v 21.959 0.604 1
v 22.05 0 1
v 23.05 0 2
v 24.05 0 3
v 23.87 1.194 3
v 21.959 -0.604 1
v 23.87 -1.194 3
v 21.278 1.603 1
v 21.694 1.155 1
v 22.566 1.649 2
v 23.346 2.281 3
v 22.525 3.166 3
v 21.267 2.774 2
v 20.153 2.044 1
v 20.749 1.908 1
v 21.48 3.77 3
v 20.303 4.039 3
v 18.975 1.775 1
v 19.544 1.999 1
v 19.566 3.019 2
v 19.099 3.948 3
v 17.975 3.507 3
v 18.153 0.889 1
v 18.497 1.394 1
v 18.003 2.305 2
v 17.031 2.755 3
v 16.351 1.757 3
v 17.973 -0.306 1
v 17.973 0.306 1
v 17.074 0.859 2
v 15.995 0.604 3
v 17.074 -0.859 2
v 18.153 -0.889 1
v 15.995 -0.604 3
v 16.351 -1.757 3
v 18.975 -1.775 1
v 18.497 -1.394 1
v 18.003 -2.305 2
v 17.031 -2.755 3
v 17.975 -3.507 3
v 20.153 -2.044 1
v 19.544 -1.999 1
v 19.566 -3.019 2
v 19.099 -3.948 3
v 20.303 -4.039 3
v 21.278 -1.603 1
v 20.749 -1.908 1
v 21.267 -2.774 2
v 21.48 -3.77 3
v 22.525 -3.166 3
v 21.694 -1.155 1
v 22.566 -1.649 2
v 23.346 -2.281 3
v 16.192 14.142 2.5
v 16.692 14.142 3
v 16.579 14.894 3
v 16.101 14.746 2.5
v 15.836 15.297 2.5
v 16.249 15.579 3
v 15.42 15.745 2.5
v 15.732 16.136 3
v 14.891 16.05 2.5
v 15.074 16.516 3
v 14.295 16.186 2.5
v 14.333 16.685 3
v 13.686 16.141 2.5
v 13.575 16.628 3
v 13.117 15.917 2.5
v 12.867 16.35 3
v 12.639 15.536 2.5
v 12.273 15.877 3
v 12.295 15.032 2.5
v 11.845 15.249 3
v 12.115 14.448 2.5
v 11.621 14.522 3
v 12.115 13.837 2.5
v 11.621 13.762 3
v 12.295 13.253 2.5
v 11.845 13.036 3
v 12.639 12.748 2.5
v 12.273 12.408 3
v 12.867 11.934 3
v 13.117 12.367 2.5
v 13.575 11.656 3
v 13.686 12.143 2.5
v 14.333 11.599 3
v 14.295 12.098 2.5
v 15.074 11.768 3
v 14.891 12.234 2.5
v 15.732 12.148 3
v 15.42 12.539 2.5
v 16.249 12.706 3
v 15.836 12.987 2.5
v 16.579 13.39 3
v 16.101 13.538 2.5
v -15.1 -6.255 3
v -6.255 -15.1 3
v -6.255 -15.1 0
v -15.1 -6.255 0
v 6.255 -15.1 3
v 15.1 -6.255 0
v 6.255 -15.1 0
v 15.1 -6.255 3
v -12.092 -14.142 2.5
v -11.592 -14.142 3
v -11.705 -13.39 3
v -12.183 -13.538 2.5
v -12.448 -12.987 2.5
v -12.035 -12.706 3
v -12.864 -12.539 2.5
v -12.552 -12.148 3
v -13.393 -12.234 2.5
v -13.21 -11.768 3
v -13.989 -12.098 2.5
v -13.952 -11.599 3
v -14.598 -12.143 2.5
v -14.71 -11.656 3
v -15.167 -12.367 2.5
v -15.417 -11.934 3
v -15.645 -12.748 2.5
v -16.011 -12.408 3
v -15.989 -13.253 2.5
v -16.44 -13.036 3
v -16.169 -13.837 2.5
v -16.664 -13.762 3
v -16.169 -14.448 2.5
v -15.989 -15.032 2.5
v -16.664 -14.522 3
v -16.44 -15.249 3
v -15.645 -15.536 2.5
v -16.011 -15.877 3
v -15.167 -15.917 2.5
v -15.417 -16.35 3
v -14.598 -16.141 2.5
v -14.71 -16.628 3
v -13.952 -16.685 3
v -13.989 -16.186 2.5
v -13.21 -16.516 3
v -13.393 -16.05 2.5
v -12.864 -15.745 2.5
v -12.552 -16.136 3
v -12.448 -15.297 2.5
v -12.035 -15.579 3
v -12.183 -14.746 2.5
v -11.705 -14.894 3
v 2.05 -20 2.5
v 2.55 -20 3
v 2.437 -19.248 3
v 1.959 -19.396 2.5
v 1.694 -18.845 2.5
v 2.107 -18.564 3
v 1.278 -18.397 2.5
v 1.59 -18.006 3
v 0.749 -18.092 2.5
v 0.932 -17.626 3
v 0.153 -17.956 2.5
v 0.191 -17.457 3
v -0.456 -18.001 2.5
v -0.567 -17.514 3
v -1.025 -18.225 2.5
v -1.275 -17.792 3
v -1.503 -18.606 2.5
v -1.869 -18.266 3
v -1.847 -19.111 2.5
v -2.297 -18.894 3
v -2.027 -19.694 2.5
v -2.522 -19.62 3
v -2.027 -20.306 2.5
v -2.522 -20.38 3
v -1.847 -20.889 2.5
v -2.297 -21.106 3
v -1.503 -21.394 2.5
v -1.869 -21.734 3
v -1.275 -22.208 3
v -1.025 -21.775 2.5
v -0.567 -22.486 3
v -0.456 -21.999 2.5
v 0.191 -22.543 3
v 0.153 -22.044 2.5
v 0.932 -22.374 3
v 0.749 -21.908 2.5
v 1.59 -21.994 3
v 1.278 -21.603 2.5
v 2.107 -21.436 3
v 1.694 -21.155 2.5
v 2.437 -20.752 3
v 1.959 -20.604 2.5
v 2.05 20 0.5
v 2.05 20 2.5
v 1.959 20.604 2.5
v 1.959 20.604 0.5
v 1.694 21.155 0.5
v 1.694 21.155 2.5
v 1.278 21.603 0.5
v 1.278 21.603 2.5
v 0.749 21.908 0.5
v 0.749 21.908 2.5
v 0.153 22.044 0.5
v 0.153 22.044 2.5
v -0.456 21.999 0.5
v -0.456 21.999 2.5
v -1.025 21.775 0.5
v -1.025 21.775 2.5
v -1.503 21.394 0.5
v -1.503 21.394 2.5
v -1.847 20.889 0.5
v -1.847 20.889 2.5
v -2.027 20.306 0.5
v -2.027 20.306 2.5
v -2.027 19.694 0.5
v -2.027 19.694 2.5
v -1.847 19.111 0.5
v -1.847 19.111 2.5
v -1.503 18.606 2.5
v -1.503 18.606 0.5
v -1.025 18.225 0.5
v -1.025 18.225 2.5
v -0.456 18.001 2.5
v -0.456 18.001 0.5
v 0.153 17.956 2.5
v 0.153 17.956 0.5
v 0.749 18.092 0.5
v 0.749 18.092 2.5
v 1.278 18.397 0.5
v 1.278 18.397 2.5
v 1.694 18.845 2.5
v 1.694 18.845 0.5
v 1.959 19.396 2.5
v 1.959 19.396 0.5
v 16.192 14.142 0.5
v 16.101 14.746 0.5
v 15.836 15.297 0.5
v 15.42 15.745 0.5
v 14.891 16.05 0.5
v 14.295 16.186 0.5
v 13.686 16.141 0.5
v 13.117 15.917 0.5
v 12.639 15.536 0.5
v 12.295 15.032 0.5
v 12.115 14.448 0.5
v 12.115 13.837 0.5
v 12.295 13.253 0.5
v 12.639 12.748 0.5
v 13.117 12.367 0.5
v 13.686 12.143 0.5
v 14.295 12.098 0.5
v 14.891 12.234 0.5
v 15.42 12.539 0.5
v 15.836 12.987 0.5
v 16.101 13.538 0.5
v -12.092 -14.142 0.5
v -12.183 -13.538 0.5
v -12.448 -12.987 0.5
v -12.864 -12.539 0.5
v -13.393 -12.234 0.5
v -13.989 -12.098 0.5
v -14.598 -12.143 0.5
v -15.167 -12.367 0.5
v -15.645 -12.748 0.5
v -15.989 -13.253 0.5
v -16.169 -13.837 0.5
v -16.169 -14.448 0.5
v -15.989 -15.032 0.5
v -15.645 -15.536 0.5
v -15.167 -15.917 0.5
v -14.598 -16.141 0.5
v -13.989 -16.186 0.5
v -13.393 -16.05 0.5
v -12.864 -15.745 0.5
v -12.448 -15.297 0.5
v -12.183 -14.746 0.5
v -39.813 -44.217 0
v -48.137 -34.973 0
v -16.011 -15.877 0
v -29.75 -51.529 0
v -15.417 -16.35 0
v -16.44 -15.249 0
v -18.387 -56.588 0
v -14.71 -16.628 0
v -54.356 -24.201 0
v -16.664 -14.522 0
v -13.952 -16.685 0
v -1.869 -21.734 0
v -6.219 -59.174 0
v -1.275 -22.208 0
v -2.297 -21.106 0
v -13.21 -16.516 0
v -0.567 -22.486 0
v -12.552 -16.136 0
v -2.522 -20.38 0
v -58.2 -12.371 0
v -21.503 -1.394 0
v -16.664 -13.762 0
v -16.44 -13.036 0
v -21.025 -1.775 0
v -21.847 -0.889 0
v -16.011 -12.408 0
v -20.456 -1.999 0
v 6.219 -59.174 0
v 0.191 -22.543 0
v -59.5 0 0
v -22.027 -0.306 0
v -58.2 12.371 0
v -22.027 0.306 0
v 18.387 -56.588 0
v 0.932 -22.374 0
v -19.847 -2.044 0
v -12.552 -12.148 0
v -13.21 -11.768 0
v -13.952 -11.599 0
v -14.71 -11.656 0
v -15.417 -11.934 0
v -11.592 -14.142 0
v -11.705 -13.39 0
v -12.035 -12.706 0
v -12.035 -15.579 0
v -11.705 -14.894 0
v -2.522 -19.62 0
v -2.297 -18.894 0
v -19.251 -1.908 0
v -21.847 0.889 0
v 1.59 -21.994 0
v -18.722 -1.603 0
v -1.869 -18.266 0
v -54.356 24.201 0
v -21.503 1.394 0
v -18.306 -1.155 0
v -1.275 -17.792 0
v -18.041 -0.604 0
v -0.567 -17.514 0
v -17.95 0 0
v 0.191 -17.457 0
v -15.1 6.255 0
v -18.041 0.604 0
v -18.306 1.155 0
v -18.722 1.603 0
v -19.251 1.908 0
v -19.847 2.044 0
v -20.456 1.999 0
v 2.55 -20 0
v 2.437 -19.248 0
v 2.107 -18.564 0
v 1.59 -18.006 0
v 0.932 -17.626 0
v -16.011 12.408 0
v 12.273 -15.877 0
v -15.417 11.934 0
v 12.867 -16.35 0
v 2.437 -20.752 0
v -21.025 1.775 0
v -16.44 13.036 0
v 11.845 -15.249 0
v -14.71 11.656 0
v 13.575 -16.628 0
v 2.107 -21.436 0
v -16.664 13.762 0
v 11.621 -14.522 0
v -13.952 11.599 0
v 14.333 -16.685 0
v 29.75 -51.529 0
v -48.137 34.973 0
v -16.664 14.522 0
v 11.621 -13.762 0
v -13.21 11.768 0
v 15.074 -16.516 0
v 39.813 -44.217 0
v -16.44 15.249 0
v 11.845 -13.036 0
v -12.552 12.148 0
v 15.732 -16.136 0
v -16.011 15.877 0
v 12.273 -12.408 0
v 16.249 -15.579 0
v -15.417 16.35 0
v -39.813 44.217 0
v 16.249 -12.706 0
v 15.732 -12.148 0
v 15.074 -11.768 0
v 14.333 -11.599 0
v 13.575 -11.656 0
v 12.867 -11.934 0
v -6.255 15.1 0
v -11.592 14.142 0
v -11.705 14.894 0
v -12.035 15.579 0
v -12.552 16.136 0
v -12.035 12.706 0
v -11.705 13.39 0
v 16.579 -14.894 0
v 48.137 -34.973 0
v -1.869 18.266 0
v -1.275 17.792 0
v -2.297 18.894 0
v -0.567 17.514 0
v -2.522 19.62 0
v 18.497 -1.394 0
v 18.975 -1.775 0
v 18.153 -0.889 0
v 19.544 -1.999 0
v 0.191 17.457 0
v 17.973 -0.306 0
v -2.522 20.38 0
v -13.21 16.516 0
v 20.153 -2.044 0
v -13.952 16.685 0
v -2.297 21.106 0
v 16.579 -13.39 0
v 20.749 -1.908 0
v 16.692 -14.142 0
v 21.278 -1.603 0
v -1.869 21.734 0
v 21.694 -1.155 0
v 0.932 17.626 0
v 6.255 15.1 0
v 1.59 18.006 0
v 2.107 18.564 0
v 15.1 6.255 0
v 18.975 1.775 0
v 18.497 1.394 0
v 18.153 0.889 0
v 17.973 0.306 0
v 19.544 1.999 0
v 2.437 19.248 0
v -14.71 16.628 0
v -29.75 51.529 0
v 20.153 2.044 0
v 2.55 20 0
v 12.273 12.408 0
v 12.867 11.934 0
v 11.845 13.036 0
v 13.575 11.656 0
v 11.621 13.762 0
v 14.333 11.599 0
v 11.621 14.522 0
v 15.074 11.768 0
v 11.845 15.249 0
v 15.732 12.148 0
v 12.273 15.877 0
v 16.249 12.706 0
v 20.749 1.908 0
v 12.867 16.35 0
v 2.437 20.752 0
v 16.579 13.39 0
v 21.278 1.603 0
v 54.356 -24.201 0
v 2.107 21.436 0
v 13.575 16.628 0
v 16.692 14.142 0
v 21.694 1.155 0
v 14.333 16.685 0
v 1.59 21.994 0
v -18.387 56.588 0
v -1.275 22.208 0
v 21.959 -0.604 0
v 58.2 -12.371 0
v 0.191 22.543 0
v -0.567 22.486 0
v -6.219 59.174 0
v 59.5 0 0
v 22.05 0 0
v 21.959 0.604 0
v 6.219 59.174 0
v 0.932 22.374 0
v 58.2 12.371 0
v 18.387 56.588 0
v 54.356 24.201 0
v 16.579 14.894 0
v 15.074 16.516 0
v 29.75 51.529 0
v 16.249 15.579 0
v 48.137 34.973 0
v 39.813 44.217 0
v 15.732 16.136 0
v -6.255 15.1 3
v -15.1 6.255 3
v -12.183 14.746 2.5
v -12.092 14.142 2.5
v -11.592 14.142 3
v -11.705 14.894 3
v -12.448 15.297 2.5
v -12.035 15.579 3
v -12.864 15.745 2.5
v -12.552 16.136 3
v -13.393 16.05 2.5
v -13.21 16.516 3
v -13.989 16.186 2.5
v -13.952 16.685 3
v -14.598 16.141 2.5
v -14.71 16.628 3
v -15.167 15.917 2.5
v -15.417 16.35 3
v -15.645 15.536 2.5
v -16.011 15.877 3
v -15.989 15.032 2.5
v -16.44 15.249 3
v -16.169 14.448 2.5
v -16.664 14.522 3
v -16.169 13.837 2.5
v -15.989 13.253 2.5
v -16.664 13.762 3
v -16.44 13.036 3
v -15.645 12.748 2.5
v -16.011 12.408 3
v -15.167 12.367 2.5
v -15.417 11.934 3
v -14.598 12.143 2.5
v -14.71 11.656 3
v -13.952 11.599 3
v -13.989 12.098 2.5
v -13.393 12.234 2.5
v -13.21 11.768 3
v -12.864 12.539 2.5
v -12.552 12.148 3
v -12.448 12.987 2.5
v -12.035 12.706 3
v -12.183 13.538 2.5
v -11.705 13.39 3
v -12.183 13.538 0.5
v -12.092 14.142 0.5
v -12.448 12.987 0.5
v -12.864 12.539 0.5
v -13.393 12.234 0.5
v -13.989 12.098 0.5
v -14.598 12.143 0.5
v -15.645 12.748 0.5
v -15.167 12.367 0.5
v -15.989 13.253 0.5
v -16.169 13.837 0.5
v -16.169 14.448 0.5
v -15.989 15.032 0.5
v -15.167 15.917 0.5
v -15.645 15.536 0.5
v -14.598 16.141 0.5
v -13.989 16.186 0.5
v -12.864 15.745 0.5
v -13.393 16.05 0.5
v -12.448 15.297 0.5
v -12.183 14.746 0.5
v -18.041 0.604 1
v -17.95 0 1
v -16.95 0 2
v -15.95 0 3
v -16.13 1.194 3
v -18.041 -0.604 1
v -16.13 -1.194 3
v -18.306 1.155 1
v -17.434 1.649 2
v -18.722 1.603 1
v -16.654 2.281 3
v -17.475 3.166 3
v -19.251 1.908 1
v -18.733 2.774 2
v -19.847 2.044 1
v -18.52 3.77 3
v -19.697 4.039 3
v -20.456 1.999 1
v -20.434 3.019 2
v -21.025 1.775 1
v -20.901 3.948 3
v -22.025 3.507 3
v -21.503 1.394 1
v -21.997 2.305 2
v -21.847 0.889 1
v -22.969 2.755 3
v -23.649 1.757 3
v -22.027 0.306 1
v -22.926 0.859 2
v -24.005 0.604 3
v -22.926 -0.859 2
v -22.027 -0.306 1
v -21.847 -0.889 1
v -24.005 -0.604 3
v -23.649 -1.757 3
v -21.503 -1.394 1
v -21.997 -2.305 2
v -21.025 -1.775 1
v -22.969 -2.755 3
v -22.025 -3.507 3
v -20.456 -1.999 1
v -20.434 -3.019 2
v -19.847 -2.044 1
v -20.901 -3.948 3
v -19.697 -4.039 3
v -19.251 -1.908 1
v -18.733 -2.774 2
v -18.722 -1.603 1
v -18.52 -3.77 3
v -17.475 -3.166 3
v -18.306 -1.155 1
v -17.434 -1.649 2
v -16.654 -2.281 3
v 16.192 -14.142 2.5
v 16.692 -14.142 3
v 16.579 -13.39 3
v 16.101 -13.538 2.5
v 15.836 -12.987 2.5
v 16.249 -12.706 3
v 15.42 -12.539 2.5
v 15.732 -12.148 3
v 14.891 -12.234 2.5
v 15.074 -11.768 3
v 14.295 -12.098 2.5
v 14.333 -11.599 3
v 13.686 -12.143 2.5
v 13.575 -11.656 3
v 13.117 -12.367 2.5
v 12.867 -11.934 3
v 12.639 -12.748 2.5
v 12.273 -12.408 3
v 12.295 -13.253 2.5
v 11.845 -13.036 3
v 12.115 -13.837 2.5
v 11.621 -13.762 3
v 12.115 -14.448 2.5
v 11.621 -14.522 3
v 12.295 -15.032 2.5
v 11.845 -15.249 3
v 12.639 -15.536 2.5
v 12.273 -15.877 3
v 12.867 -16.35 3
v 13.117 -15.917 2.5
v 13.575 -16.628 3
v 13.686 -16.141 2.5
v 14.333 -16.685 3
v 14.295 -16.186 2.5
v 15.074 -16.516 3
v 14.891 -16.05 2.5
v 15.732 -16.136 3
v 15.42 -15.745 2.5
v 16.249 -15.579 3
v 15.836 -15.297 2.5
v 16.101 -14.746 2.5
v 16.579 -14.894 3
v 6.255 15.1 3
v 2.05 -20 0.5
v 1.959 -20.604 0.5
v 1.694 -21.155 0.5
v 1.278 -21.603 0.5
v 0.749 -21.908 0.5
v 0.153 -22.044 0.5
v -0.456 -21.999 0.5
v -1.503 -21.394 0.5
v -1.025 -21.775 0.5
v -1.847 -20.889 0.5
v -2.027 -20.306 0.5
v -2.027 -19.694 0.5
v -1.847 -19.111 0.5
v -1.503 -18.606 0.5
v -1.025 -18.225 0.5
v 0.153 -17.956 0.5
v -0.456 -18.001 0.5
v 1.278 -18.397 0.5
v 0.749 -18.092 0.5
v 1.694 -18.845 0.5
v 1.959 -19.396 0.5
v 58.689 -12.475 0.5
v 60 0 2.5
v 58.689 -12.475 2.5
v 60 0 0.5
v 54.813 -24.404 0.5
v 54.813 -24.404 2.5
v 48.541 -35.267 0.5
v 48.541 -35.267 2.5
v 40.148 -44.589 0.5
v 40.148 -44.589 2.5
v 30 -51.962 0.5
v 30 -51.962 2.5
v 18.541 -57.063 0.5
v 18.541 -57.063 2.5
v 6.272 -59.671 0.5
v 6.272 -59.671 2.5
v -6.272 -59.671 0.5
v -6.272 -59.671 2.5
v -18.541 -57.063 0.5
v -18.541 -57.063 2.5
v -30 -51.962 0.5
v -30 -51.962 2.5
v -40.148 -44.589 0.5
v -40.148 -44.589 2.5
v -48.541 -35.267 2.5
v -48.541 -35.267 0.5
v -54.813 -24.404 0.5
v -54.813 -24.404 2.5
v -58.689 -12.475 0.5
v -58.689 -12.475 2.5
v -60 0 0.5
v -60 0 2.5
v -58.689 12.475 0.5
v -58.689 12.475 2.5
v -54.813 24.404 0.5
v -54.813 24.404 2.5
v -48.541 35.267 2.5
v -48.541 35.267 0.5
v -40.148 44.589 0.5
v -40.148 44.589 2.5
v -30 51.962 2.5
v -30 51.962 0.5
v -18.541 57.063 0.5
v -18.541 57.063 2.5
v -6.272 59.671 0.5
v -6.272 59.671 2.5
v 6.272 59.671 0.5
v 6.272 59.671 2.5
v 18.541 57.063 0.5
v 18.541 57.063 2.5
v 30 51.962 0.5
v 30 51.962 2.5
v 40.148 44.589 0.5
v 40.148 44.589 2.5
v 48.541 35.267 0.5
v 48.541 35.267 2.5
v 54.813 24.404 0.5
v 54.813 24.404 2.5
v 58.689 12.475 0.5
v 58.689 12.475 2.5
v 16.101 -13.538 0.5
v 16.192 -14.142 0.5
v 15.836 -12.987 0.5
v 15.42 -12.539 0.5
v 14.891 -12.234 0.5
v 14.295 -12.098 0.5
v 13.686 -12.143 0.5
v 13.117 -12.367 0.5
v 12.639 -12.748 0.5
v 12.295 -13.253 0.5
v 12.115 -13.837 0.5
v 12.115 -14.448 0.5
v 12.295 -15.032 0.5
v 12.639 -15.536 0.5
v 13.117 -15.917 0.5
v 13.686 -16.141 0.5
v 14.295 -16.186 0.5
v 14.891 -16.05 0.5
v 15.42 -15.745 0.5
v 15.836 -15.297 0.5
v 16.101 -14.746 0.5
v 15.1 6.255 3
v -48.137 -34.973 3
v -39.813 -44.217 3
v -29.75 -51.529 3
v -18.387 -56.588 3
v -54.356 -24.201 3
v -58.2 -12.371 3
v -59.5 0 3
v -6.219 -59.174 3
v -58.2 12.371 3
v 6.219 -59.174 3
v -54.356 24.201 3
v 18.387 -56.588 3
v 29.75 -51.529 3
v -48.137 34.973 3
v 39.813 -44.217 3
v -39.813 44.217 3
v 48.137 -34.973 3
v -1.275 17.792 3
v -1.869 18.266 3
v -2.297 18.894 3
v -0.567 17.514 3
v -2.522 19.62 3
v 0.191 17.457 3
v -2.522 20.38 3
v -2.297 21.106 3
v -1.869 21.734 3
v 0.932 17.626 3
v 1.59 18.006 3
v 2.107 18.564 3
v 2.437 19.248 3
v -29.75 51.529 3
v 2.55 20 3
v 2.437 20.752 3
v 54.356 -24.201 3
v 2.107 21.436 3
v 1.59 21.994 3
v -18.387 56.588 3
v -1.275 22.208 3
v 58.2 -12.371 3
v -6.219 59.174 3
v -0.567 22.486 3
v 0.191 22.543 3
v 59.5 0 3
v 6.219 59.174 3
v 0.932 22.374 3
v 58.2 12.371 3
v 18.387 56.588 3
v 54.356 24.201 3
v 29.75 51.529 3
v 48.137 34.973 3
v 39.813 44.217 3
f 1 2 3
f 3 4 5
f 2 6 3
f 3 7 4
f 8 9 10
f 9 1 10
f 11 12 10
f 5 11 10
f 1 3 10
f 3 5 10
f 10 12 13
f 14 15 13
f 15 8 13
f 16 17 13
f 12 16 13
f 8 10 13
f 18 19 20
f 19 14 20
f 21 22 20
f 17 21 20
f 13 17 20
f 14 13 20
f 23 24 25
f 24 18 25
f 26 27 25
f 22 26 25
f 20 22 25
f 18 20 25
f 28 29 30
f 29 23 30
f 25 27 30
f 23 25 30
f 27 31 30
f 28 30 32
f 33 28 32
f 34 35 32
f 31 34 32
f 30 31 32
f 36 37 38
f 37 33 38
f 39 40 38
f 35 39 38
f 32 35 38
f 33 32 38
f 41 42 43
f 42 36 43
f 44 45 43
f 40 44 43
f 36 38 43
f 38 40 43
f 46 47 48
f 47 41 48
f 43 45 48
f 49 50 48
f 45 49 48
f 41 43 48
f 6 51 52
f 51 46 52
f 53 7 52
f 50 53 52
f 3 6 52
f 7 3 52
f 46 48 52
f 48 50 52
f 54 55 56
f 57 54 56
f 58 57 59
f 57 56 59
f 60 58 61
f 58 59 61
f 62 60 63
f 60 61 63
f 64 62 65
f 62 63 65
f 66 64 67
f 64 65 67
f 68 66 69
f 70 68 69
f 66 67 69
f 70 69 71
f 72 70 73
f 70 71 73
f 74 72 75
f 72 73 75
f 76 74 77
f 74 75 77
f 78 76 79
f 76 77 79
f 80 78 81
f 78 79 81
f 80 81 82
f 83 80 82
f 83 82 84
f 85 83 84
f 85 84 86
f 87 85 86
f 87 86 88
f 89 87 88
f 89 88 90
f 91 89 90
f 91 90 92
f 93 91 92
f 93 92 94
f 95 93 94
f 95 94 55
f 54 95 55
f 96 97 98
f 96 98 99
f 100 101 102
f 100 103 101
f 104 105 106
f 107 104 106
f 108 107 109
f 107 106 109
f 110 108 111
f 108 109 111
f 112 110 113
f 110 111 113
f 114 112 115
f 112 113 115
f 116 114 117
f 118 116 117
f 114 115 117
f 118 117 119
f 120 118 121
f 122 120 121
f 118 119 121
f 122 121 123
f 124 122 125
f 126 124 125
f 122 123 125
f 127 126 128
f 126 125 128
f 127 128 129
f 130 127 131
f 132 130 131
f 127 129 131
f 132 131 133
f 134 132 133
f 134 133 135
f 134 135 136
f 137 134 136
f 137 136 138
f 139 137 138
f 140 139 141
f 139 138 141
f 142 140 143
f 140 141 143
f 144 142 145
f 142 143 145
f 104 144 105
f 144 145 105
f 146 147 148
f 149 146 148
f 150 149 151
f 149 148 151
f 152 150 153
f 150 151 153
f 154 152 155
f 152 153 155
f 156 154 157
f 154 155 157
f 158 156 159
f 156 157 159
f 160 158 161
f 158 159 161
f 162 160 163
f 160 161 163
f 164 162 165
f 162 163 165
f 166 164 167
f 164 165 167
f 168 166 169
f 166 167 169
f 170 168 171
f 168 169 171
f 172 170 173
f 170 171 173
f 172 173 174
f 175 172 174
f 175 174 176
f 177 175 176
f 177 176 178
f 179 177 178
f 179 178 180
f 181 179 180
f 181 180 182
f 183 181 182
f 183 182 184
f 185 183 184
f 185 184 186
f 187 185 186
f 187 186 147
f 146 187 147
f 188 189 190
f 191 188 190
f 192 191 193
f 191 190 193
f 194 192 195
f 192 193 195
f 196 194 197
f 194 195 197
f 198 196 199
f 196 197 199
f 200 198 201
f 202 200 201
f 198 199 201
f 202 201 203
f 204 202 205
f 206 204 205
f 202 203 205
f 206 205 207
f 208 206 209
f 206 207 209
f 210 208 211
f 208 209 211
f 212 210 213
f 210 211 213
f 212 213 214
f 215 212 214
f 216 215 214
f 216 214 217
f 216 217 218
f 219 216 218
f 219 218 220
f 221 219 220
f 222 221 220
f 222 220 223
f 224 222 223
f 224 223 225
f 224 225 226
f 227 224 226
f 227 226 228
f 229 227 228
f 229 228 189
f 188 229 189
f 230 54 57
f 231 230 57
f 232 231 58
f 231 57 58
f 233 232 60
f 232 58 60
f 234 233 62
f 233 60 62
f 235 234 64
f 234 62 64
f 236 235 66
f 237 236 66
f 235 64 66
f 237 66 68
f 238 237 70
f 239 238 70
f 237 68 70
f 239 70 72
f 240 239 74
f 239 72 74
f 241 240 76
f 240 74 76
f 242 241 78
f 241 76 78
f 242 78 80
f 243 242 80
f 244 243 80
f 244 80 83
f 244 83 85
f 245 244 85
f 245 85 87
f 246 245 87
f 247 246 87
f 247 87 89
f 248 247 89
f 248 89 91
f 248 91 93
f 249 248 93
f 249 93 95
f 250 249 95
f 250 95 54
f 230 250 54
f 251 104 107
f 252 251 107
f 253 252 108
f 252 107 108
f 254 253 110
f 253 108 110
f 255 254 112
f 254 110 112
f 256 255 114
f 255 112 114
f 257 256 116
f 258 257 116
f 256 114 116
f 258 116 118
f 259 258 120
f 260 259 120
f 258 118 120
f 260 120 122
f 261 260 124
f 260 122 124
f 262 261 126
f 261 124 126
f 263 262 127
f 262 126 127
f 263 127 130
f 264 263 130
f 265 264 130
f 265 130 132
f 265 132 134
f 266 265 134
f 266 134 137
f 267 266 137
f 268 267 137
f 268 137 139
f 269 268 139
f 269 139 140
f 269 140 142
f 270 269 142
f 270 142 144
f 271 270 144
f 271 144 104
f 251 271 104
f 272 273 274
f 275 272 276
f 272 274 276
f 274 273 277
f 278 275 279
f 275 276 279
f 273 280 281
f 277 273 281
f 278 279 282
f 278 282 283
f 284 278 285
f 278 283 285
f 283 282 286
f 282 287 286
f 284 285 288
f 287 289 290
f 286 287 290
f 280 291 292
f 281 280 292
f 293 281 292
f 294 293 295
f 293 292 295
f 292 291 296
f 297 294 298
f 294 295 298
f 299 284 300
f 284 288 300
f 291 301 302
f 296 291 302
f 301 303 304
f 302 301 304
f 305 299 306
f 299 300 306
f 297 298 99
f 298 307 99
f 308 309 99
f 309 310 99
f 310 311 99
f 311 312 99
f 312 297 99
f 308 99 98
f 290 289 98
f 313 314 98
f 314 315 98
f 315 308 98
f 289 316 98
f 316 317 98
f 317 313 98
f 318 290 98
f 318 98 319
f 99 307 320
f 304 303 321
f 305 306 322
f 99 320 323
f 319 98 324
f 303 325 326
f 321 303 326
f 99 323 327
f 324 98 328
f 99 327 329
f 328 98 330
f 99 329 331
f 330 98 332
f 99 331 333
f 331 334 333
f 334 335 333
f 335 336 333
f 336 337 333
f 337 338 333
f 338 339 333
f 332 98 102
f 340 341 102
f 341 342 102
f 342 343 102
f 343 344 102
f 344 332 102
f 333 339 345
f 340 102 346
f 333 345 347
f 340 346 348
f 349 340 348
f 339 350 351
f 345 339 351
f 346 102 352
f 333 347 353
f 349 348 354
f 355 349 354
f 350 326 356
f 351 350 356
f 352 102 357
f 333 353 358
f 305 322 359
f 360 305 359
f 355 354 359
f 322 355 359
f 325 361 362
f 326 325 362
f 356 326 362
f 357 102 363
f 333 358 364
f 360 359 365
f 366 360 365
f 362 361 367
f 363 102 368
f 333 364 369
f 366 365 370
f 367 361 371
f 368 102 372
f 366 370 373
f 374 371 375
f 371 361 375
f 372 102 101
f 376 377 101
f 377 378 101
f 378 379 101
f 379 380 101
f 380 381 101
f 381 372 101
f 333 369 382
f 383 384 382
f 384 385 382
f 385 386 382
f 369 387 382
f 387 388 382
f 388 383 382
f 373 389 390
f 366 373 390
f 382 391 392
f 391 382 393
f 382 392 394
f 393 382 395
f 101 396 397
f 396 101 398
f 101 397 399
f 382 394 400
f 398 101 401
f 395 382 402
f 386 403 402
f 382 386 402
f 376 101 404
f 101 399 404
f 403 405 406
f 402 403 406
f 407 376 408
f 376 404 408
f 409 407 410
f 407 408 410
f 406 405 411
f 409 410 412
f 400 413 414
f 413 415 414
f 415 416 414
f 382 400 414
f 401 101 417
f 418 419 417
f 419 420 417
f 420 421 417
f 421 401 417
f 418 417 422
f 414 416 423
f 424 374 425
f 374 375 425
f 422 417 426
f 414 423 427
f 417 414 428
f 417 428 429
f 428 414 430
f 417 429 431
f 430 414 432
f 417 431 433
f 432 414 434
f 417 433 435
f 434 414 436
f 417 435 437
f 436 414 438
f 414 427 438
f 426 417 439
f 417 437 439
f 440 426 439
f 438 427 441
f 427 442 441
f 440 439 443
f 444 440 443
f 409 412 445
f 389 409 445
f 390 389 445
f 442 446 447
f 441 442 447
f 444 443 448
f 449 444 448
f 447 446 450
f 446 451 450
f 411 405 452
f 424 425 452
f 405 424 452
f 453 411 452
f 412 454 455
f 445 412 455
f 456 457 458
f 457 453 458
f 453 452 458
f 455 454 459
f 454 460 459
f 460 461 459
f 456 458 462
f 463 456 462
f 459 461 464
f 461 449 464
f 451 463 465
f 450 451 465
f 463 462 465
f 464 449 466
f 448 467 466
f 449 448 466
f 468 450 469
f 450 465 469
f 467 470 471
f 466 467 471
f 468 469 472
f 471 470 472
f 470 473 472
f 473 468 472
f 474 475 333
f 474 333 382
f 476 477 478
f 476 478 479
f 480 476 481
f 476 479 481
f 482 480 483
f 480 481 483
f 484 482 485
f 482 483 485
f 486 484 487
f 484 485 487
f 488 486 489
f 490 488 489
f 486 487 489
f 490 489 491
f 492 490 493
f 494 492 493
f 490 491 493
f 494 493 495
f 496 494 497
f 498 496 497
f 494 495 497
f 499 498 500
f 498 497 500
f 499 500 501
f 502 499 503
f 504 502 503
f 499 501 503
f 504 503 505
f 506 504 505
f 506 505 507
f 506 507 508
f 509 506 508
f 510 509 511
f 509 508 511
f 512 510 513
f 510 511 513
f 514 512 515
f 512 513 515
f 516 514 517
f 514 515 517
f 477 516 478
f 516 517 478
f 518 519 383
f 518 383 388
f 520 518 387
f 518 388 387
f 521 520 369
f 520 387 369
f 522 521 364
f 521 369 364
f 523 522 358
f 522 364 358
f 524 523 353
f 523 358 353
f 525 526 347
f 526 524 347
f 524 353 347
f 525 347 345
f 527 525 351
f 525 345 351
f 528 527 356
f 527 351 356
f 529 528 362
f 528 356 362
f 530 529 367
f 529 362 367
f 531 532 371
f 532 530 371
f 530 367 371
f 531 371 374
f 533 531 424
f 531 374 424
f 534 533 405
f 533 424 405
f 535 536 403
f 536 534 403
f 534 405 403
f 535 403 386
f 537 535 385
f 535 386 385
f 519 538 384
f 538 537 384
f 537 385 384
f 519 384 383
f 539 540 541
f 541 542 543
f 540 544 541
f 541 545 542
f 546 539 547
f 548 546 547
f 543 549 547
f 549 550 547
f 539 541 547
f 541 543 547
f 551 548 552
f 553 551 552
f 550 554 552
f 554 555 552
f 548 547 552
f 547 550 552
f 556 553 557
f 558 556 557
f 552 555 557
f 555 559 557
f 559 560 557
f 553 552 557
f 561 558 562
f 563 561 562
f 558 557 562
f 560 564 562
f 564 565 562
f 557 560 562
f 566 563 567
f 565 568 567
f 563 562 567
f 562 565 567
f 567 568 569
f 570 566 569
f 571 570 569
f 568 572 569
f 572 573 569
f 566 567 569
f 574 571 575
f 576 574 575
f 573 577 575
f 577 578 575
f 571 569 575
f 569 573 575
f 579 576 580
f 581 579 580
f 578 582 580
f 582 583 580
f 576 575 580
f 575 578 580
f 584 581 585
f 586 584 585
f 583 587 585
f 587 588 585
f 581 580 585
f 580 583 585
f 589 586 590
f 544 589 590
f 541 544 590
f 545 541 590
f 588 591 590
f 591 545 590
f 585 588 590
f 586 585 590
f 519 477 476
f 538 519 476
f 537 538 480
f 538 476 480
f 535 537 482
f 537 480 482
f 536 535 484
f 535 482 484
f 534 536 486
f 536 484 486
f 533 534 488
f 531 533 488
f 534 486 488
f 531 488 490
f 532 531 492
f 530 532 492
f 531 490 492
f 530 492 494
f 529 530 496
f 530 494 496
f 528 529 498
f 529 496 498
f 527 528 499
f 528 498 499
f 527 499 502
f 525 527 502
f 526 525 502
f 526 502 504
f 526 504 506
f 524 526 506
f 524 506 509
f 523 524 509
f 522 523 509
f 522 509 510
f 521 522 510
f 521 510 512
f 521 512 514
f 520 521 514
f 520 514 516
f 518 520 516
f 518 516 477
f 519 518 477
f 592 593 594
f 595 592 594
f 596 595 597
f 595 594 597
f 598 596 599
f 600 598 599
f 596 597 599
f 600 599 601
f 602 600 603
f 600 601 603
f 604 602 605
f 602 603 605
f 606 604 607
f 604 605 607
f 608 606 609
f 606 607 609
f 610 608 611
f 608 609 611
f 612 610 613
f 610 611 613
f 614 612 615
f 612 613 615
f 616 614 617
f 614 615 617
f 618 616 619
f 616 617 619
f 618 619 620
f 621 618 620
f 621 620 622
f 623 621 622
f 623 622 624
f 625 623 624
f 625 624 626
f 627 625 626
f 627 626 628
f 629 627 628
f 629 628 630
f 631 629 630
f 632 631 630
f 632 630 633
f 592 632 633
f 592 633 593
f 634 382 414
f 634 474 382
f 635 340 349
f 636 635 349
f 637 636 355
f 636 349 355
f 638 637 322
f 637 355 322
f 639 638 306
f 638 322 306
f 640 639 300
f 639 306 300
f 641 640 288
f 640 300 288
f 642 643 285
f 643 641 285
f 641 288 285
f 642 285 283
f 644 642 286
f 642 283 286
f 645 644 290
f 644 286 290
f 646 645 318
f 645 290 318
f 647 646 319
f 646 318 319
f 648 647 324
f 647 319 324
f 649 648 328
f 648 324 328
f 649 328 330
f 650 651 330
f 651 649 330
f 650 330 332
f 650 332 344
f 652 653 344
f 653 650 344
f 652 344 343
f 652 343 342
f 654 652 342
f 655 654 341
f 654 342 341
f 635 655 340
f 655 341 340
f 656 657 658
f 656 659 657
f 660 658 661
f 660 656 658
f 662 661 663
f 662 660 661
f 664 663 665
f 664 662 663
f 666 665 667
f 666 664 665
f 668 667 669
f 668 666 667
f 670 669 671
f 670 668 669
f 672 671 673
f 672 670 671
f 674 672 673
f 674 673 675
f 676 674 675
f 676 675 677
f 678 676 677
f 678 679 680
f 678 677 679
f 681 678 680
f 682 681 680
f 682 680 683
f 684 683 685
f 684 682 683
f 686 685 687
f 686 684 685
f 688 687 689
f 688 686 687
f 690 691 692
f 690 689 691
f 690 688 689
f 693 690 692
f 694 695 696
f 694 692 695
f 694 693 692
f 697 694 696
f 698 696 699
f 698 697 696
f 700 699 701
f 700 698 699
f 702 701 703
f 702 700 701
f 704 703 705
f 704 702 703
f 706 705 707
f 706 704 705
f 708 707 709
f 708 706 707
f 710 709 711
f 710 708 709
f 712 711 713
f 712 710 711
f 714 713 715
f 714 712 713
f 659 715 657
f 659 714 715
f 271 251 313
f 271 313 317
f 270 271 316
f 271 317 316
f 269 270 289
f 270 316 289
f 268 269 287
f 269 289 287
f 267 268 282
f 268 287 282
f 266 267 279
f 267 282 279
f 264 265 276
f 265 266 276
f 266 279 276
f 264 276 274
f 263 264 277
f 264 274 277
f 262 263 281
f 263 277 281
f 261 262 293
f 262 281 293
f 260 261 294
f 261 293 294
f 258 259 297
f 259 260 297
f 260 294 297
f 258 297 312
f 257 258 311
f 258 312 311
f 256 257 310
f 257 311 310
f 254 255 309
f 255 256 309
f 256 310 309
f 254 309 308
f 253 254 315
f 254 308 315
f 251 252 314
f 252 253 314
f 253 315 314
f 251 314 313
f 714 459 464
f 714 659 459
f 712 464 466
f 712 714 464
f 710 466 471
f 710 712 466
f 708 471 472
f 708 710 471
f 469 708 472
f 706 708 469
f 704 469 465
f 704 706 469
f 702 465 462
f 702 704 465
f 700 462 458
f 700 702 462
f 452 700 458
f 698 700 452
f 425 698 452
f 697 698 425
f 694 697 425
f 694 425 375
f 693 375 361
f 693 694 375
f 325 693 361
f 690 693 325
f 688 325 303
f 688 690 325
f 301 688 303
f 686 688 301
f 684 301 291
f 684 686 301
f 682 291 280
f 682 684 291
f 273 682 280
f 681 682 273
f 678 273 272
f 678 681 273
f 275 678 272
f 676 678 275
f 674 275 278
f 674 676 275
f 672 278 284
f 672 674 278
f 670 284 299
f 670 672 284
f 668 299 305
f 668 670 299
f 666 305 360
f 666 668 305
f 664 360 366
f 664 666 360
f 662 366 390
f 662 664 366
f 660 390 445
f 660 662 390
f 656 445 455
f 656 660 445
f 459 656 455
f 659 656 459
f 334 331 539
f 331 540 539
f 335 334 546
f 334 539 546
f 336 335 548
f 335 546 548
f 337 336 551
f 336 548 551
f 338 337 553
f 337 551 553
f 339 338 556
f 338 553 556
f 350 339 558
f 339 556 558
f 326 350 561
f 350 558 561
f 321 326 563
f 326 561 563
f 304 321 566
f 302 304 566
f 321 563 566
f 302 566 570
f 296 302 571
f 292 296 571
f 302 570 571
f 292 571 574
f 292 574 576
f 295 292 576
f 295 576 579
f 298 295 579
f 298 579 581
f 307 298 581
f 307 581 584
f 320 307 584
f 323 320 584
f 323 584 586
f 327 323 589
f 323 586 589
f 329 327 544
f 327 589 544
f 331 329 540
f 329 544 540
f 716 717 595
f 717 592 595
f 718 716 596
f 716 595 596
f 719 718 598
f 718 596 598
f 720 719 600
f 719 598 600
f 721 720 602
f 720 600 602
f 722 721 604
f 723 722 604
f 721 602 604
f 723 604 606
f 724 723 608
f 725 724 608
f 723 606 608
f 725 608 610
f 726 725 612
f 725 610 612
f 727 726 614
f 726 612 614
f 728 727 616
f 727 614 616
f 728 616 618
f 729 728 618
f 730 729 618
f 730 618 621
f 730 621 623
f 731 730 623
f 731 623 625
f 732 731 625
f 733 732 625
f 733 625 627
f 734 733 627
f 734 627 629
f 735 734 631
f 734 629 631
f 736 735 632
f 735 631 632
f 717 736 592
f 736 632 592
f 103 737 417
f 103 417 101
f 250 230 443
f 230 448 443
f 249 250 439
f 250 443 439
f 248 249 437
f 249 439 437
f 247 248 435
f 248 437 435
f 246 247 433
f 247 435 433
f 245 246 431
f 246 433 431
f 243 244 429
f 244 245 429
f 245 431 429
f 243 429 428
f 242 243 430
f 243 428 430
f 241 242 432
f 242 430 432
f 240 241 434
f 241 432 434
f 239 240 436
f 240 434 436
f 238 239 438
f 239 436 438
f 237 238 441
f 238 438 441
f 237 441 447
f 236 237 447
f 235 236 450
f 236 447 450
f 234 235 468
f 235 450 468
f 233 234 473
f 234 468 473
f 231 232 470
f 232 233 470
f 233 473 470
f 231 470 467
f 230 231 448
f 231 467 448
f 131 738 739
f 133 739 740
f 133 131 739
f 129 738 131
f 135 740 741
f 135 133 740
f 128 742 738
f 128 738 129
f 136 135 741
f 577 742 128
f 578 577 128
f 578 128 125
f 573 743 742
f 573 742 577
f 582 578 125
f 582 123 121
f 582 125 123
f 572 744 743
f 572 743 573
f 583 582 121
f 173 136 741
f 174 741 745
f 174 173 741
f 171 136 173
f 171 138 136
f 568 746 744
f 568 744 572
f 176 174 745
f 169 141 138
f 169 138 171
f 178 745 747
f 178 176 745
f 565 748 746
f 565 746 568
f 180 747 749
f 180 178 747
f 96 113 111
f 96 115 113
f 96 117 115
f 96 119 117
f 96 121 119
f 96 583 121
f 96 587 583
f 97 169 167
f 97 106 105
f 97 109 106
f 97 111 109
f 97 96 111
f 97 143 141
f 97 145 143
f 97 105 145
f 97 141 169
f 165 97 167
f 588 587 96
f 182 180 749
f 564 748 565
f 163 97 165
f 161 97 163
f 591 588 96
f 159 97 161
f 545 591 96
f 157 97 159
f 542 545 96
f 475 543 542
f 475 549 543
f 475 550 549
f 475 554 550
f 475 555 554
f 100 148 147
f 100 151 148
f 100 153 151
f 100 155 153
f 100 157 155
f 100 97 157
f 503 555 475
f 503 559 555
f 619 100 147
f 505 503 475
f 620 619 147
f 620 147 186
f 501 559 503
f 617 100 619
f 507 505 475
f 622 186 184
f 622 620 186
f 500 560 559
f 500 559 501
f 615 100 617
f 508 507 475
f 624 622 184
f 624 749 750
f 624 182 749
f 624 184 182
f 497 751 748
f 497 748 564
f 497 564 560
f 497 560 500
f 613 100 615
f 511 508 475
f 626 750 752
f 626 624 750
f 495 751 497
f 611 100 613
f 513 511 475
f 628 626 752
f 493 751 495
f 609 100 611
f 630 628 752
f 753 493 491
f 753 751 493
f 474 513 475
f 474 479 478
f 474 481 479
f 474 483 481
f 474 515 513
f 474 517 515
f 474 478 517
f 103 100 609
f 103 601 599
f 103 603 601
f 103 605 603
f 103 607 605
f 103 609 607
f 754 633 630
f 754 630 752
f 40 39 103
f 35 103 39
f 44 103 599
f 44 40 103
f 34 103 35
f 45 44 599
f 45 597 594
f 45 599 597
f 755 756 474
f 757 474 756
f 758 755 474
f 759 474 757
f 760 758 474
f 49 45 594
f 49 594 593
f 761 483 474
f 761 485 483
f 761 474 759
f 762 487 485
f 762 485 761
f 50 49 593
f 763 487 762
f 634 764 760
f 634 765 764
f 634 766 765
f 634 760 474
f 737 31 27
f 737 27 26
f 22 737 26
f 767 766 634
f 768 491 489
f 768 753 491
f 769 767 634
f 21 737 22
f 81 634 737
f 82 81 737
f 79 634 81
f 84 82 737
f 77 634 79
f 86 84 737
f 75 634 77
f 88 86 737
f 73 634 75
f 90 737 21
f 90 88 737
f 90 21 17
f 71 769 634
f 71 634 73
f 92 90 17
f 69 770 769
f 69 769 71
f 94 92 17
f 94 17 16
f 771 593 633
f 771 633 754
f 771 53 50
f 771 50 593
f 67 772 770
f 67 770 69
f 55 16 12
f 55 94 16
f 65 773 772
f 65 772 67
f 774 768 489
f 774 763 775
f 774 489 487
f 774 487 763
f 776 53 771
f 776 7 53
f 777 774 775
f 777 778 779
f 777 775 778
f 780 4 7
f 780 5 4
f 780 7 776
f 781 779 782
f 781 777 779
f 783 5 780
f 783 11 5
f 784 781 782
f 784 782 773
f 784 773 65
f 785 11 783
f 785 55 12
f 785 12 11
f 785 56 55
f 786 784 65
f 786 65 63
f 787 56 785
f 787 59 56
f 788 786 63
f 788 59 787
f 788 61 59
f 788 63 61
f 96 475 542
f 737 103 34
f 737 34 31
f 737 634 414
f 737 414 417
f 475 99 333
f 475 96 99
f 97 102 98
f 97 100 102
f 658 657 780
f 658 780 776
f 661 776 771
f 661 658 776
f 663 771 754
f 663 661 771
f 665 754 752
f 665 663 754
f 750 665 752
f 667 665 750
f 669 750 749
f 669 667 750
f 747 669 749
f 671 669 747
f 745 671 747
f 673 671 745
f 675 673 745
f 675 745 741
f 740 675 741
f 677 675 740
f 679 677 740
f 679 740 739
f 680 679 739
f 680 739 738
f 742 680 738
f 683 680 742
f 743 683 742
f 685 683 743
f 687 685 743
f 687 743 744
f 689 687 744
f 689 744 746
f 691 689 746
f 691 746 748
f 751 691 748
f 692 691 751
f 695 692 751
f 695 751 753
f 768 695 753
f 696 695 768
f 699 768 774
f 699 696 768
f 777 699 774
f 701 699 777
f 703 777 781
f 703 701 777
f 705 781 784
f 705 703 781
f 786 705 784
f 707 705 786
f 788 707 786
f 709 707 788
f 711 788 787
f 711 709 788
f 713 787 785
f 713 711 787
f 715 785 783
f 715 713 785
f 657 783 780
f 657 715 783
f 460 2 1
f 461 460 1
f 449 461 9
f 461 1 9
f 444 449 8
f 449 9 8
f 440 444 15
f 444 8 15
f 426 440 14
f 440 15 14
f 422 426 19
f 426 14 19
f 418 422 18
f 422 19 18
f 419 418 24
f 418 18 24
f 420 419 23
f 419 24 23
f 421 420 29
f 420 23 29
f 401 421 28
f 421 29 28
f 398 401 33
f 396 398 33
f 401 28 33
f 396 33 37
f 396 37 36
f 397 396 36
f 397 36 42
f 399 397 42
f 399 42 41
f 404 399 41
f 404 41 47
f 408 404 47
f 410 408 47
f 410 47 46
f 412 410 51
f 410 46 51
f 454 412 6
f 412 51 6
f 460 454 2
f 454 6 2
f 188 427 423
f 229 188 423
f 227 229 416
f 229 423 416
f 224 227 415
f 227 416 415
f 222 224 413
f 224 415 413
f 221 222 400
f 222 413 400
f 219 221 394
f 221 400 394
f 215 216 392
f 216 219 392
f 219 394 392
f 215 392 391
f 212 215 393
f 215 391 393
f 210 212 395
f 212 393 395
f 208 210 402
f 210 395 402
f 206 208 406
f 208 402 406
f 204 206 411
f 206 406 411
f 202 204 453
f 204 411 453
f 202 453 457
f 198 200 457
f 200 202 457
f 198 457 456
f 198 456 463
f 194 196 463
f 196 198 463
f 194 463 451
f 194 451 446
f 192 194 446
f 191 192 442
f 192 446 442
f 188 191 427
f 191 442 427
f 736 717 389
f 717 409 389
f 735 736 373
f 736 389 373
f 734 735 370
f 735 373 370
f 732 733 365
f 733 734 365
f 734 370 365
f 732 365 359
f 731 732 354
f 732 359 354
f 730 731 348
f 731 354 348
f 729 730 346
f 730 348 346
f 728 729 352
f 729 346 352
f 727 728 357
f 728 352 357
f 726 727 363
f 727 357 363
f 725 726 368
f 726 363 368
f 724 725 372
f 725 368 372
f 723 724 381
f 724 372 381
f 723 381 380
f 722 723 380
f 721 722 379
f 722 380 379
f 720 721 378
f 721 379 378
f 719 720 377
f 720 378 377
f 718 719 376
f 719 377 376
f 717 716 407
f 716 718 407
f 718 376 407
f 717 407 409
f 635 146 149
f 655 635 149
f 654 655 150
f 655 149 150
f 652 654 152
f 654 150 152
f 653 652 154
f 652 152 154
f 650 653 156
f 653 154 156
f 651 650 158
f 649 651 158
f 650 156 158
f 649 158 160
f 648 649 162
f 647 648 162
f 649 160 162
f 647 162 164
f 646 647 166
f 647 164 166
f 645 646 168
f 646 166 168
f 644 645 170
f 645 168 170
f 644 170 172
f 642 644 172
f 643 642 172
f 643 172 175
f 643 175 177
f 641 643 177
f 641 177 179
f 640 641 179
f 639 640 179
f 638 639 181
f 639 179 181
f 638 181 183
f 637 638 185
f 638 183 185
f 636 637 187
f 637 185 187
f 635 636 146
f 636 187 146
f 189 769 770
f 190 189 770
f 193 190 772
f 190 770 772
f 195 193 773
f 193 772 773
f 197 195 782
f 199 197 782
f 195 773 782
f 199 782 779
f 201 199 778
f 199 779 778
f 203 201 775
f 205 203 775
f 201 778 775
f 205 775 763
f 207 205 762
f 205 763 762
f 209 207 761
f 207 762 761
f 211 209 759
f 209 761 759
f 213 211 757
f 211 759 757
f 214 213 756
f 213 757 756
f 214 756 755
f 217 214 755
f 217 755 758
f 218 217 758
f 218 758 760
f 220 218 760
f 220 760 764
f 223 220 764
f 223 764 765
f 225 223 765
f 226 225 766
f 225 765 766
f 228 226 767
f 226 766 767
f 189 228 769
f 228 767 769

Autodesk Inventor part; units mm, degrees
ref_plane "YZ Plane" through (0, 0, 0) normal (1, 0, 0) x (0, 1, 0)
ref_plane "XZ Plane" through (0, 0, 0) normal (0, 1, 0) x (-1, 0, 0)
ref_plane "XY Plane" through (0, 0, 0) normal (0, 0, 1) x (1, 0, 0)
sketch "Sketch1" plane through (0, 0, 0) normal (0, 0, 1) x (1, 0, 0)
  circle A0 centre (0, 0) radius 60
  dimension "d0" = 120
extrude "Extrusion1" add sketch "Sketch1" along normal blind 3
sketch "Sketch3" plane through (0, 0, 3) normal (0, 0, 1) x (1, 0, 0)
  line L0 (-15.1, 6.2546) -> (-6.2546, 15.1)
  line L1 (-15.1, -6.2546) -> (-15.1, 6.2546)
  line L2 (-6.2546, -15.1) -> (-15.1, -6.2546)
  line L3 (6.2546, -15.1) -> (-6.2546, -15.1)
  line L4 (15.1, -6.2546) -> (6.2546, -15.1)
  line L5 (15.1, 6.2546) -> (15.1, -6.2546)
  line L6 (6.2546, 15.1) -> (15.1, 6.2546)
  line L7 (-6.2546, 15.1) -> (6.2546, 15.1)
  point P0 (0, 0)
  point P1 (0, 0)
extrude "Extrusion3" cut sketch "Sketch3" against normal through all
sketch "Sketch4" plane through (0, 0, 3) normal (0, 0, 1) x (1, 0, 0)
  line L0 (0, 0) -> (41.4197, 0)
  circle A0 centre (20, 0) radius 2.05
  circle A1 centre (20, 0) radius 2.05
  circle A2 centre (14.1421, 14.1421) radius 2.05
  circle A3 centre (0, 20) radius 2.05
  circle A4 centre (-14.1421, 14.1421) radius 2.05
  circle A5 centre (-20, 0) radius 2.05
  circle A6 centre (-14.1421, -14.1421) radius 2.05
  circle A7 centre (0, -20) radius 2.05
  circle A8 centre (14.1421, -14.1421) radius 2.05
  dimension "d26" = 360
  dimension "d27" = 4.1
extrude "Extrusion4" cut sketch "Sketch4" against normal through all
chamfer "Chamfer1" distance 2 angle 45 2 edges at (-22.05, 0, 3) (17.95, 0, 3)
chamfer "Chamfer2" distance 0.5 angle 45 14 edges at (-60, 0, 3) (-60, 0, 0) (-2.05, -20, 3) (12.0921, -14.1421, 3) (-16.1921, -14.1421, 3) (-16.1921, 14.1421, 3) (-2.05, 20, 3) (12.0921, 14.1421, 3) (-16.1921, -14.1421, 0) (-2.05, -20, 0) (12.0921, -14.1421, 0) (-16.1921, 14.1421, 0) (-2.05, 20, 0) (12.0921, 14.1421, 0)
properties part number "spool_side"
